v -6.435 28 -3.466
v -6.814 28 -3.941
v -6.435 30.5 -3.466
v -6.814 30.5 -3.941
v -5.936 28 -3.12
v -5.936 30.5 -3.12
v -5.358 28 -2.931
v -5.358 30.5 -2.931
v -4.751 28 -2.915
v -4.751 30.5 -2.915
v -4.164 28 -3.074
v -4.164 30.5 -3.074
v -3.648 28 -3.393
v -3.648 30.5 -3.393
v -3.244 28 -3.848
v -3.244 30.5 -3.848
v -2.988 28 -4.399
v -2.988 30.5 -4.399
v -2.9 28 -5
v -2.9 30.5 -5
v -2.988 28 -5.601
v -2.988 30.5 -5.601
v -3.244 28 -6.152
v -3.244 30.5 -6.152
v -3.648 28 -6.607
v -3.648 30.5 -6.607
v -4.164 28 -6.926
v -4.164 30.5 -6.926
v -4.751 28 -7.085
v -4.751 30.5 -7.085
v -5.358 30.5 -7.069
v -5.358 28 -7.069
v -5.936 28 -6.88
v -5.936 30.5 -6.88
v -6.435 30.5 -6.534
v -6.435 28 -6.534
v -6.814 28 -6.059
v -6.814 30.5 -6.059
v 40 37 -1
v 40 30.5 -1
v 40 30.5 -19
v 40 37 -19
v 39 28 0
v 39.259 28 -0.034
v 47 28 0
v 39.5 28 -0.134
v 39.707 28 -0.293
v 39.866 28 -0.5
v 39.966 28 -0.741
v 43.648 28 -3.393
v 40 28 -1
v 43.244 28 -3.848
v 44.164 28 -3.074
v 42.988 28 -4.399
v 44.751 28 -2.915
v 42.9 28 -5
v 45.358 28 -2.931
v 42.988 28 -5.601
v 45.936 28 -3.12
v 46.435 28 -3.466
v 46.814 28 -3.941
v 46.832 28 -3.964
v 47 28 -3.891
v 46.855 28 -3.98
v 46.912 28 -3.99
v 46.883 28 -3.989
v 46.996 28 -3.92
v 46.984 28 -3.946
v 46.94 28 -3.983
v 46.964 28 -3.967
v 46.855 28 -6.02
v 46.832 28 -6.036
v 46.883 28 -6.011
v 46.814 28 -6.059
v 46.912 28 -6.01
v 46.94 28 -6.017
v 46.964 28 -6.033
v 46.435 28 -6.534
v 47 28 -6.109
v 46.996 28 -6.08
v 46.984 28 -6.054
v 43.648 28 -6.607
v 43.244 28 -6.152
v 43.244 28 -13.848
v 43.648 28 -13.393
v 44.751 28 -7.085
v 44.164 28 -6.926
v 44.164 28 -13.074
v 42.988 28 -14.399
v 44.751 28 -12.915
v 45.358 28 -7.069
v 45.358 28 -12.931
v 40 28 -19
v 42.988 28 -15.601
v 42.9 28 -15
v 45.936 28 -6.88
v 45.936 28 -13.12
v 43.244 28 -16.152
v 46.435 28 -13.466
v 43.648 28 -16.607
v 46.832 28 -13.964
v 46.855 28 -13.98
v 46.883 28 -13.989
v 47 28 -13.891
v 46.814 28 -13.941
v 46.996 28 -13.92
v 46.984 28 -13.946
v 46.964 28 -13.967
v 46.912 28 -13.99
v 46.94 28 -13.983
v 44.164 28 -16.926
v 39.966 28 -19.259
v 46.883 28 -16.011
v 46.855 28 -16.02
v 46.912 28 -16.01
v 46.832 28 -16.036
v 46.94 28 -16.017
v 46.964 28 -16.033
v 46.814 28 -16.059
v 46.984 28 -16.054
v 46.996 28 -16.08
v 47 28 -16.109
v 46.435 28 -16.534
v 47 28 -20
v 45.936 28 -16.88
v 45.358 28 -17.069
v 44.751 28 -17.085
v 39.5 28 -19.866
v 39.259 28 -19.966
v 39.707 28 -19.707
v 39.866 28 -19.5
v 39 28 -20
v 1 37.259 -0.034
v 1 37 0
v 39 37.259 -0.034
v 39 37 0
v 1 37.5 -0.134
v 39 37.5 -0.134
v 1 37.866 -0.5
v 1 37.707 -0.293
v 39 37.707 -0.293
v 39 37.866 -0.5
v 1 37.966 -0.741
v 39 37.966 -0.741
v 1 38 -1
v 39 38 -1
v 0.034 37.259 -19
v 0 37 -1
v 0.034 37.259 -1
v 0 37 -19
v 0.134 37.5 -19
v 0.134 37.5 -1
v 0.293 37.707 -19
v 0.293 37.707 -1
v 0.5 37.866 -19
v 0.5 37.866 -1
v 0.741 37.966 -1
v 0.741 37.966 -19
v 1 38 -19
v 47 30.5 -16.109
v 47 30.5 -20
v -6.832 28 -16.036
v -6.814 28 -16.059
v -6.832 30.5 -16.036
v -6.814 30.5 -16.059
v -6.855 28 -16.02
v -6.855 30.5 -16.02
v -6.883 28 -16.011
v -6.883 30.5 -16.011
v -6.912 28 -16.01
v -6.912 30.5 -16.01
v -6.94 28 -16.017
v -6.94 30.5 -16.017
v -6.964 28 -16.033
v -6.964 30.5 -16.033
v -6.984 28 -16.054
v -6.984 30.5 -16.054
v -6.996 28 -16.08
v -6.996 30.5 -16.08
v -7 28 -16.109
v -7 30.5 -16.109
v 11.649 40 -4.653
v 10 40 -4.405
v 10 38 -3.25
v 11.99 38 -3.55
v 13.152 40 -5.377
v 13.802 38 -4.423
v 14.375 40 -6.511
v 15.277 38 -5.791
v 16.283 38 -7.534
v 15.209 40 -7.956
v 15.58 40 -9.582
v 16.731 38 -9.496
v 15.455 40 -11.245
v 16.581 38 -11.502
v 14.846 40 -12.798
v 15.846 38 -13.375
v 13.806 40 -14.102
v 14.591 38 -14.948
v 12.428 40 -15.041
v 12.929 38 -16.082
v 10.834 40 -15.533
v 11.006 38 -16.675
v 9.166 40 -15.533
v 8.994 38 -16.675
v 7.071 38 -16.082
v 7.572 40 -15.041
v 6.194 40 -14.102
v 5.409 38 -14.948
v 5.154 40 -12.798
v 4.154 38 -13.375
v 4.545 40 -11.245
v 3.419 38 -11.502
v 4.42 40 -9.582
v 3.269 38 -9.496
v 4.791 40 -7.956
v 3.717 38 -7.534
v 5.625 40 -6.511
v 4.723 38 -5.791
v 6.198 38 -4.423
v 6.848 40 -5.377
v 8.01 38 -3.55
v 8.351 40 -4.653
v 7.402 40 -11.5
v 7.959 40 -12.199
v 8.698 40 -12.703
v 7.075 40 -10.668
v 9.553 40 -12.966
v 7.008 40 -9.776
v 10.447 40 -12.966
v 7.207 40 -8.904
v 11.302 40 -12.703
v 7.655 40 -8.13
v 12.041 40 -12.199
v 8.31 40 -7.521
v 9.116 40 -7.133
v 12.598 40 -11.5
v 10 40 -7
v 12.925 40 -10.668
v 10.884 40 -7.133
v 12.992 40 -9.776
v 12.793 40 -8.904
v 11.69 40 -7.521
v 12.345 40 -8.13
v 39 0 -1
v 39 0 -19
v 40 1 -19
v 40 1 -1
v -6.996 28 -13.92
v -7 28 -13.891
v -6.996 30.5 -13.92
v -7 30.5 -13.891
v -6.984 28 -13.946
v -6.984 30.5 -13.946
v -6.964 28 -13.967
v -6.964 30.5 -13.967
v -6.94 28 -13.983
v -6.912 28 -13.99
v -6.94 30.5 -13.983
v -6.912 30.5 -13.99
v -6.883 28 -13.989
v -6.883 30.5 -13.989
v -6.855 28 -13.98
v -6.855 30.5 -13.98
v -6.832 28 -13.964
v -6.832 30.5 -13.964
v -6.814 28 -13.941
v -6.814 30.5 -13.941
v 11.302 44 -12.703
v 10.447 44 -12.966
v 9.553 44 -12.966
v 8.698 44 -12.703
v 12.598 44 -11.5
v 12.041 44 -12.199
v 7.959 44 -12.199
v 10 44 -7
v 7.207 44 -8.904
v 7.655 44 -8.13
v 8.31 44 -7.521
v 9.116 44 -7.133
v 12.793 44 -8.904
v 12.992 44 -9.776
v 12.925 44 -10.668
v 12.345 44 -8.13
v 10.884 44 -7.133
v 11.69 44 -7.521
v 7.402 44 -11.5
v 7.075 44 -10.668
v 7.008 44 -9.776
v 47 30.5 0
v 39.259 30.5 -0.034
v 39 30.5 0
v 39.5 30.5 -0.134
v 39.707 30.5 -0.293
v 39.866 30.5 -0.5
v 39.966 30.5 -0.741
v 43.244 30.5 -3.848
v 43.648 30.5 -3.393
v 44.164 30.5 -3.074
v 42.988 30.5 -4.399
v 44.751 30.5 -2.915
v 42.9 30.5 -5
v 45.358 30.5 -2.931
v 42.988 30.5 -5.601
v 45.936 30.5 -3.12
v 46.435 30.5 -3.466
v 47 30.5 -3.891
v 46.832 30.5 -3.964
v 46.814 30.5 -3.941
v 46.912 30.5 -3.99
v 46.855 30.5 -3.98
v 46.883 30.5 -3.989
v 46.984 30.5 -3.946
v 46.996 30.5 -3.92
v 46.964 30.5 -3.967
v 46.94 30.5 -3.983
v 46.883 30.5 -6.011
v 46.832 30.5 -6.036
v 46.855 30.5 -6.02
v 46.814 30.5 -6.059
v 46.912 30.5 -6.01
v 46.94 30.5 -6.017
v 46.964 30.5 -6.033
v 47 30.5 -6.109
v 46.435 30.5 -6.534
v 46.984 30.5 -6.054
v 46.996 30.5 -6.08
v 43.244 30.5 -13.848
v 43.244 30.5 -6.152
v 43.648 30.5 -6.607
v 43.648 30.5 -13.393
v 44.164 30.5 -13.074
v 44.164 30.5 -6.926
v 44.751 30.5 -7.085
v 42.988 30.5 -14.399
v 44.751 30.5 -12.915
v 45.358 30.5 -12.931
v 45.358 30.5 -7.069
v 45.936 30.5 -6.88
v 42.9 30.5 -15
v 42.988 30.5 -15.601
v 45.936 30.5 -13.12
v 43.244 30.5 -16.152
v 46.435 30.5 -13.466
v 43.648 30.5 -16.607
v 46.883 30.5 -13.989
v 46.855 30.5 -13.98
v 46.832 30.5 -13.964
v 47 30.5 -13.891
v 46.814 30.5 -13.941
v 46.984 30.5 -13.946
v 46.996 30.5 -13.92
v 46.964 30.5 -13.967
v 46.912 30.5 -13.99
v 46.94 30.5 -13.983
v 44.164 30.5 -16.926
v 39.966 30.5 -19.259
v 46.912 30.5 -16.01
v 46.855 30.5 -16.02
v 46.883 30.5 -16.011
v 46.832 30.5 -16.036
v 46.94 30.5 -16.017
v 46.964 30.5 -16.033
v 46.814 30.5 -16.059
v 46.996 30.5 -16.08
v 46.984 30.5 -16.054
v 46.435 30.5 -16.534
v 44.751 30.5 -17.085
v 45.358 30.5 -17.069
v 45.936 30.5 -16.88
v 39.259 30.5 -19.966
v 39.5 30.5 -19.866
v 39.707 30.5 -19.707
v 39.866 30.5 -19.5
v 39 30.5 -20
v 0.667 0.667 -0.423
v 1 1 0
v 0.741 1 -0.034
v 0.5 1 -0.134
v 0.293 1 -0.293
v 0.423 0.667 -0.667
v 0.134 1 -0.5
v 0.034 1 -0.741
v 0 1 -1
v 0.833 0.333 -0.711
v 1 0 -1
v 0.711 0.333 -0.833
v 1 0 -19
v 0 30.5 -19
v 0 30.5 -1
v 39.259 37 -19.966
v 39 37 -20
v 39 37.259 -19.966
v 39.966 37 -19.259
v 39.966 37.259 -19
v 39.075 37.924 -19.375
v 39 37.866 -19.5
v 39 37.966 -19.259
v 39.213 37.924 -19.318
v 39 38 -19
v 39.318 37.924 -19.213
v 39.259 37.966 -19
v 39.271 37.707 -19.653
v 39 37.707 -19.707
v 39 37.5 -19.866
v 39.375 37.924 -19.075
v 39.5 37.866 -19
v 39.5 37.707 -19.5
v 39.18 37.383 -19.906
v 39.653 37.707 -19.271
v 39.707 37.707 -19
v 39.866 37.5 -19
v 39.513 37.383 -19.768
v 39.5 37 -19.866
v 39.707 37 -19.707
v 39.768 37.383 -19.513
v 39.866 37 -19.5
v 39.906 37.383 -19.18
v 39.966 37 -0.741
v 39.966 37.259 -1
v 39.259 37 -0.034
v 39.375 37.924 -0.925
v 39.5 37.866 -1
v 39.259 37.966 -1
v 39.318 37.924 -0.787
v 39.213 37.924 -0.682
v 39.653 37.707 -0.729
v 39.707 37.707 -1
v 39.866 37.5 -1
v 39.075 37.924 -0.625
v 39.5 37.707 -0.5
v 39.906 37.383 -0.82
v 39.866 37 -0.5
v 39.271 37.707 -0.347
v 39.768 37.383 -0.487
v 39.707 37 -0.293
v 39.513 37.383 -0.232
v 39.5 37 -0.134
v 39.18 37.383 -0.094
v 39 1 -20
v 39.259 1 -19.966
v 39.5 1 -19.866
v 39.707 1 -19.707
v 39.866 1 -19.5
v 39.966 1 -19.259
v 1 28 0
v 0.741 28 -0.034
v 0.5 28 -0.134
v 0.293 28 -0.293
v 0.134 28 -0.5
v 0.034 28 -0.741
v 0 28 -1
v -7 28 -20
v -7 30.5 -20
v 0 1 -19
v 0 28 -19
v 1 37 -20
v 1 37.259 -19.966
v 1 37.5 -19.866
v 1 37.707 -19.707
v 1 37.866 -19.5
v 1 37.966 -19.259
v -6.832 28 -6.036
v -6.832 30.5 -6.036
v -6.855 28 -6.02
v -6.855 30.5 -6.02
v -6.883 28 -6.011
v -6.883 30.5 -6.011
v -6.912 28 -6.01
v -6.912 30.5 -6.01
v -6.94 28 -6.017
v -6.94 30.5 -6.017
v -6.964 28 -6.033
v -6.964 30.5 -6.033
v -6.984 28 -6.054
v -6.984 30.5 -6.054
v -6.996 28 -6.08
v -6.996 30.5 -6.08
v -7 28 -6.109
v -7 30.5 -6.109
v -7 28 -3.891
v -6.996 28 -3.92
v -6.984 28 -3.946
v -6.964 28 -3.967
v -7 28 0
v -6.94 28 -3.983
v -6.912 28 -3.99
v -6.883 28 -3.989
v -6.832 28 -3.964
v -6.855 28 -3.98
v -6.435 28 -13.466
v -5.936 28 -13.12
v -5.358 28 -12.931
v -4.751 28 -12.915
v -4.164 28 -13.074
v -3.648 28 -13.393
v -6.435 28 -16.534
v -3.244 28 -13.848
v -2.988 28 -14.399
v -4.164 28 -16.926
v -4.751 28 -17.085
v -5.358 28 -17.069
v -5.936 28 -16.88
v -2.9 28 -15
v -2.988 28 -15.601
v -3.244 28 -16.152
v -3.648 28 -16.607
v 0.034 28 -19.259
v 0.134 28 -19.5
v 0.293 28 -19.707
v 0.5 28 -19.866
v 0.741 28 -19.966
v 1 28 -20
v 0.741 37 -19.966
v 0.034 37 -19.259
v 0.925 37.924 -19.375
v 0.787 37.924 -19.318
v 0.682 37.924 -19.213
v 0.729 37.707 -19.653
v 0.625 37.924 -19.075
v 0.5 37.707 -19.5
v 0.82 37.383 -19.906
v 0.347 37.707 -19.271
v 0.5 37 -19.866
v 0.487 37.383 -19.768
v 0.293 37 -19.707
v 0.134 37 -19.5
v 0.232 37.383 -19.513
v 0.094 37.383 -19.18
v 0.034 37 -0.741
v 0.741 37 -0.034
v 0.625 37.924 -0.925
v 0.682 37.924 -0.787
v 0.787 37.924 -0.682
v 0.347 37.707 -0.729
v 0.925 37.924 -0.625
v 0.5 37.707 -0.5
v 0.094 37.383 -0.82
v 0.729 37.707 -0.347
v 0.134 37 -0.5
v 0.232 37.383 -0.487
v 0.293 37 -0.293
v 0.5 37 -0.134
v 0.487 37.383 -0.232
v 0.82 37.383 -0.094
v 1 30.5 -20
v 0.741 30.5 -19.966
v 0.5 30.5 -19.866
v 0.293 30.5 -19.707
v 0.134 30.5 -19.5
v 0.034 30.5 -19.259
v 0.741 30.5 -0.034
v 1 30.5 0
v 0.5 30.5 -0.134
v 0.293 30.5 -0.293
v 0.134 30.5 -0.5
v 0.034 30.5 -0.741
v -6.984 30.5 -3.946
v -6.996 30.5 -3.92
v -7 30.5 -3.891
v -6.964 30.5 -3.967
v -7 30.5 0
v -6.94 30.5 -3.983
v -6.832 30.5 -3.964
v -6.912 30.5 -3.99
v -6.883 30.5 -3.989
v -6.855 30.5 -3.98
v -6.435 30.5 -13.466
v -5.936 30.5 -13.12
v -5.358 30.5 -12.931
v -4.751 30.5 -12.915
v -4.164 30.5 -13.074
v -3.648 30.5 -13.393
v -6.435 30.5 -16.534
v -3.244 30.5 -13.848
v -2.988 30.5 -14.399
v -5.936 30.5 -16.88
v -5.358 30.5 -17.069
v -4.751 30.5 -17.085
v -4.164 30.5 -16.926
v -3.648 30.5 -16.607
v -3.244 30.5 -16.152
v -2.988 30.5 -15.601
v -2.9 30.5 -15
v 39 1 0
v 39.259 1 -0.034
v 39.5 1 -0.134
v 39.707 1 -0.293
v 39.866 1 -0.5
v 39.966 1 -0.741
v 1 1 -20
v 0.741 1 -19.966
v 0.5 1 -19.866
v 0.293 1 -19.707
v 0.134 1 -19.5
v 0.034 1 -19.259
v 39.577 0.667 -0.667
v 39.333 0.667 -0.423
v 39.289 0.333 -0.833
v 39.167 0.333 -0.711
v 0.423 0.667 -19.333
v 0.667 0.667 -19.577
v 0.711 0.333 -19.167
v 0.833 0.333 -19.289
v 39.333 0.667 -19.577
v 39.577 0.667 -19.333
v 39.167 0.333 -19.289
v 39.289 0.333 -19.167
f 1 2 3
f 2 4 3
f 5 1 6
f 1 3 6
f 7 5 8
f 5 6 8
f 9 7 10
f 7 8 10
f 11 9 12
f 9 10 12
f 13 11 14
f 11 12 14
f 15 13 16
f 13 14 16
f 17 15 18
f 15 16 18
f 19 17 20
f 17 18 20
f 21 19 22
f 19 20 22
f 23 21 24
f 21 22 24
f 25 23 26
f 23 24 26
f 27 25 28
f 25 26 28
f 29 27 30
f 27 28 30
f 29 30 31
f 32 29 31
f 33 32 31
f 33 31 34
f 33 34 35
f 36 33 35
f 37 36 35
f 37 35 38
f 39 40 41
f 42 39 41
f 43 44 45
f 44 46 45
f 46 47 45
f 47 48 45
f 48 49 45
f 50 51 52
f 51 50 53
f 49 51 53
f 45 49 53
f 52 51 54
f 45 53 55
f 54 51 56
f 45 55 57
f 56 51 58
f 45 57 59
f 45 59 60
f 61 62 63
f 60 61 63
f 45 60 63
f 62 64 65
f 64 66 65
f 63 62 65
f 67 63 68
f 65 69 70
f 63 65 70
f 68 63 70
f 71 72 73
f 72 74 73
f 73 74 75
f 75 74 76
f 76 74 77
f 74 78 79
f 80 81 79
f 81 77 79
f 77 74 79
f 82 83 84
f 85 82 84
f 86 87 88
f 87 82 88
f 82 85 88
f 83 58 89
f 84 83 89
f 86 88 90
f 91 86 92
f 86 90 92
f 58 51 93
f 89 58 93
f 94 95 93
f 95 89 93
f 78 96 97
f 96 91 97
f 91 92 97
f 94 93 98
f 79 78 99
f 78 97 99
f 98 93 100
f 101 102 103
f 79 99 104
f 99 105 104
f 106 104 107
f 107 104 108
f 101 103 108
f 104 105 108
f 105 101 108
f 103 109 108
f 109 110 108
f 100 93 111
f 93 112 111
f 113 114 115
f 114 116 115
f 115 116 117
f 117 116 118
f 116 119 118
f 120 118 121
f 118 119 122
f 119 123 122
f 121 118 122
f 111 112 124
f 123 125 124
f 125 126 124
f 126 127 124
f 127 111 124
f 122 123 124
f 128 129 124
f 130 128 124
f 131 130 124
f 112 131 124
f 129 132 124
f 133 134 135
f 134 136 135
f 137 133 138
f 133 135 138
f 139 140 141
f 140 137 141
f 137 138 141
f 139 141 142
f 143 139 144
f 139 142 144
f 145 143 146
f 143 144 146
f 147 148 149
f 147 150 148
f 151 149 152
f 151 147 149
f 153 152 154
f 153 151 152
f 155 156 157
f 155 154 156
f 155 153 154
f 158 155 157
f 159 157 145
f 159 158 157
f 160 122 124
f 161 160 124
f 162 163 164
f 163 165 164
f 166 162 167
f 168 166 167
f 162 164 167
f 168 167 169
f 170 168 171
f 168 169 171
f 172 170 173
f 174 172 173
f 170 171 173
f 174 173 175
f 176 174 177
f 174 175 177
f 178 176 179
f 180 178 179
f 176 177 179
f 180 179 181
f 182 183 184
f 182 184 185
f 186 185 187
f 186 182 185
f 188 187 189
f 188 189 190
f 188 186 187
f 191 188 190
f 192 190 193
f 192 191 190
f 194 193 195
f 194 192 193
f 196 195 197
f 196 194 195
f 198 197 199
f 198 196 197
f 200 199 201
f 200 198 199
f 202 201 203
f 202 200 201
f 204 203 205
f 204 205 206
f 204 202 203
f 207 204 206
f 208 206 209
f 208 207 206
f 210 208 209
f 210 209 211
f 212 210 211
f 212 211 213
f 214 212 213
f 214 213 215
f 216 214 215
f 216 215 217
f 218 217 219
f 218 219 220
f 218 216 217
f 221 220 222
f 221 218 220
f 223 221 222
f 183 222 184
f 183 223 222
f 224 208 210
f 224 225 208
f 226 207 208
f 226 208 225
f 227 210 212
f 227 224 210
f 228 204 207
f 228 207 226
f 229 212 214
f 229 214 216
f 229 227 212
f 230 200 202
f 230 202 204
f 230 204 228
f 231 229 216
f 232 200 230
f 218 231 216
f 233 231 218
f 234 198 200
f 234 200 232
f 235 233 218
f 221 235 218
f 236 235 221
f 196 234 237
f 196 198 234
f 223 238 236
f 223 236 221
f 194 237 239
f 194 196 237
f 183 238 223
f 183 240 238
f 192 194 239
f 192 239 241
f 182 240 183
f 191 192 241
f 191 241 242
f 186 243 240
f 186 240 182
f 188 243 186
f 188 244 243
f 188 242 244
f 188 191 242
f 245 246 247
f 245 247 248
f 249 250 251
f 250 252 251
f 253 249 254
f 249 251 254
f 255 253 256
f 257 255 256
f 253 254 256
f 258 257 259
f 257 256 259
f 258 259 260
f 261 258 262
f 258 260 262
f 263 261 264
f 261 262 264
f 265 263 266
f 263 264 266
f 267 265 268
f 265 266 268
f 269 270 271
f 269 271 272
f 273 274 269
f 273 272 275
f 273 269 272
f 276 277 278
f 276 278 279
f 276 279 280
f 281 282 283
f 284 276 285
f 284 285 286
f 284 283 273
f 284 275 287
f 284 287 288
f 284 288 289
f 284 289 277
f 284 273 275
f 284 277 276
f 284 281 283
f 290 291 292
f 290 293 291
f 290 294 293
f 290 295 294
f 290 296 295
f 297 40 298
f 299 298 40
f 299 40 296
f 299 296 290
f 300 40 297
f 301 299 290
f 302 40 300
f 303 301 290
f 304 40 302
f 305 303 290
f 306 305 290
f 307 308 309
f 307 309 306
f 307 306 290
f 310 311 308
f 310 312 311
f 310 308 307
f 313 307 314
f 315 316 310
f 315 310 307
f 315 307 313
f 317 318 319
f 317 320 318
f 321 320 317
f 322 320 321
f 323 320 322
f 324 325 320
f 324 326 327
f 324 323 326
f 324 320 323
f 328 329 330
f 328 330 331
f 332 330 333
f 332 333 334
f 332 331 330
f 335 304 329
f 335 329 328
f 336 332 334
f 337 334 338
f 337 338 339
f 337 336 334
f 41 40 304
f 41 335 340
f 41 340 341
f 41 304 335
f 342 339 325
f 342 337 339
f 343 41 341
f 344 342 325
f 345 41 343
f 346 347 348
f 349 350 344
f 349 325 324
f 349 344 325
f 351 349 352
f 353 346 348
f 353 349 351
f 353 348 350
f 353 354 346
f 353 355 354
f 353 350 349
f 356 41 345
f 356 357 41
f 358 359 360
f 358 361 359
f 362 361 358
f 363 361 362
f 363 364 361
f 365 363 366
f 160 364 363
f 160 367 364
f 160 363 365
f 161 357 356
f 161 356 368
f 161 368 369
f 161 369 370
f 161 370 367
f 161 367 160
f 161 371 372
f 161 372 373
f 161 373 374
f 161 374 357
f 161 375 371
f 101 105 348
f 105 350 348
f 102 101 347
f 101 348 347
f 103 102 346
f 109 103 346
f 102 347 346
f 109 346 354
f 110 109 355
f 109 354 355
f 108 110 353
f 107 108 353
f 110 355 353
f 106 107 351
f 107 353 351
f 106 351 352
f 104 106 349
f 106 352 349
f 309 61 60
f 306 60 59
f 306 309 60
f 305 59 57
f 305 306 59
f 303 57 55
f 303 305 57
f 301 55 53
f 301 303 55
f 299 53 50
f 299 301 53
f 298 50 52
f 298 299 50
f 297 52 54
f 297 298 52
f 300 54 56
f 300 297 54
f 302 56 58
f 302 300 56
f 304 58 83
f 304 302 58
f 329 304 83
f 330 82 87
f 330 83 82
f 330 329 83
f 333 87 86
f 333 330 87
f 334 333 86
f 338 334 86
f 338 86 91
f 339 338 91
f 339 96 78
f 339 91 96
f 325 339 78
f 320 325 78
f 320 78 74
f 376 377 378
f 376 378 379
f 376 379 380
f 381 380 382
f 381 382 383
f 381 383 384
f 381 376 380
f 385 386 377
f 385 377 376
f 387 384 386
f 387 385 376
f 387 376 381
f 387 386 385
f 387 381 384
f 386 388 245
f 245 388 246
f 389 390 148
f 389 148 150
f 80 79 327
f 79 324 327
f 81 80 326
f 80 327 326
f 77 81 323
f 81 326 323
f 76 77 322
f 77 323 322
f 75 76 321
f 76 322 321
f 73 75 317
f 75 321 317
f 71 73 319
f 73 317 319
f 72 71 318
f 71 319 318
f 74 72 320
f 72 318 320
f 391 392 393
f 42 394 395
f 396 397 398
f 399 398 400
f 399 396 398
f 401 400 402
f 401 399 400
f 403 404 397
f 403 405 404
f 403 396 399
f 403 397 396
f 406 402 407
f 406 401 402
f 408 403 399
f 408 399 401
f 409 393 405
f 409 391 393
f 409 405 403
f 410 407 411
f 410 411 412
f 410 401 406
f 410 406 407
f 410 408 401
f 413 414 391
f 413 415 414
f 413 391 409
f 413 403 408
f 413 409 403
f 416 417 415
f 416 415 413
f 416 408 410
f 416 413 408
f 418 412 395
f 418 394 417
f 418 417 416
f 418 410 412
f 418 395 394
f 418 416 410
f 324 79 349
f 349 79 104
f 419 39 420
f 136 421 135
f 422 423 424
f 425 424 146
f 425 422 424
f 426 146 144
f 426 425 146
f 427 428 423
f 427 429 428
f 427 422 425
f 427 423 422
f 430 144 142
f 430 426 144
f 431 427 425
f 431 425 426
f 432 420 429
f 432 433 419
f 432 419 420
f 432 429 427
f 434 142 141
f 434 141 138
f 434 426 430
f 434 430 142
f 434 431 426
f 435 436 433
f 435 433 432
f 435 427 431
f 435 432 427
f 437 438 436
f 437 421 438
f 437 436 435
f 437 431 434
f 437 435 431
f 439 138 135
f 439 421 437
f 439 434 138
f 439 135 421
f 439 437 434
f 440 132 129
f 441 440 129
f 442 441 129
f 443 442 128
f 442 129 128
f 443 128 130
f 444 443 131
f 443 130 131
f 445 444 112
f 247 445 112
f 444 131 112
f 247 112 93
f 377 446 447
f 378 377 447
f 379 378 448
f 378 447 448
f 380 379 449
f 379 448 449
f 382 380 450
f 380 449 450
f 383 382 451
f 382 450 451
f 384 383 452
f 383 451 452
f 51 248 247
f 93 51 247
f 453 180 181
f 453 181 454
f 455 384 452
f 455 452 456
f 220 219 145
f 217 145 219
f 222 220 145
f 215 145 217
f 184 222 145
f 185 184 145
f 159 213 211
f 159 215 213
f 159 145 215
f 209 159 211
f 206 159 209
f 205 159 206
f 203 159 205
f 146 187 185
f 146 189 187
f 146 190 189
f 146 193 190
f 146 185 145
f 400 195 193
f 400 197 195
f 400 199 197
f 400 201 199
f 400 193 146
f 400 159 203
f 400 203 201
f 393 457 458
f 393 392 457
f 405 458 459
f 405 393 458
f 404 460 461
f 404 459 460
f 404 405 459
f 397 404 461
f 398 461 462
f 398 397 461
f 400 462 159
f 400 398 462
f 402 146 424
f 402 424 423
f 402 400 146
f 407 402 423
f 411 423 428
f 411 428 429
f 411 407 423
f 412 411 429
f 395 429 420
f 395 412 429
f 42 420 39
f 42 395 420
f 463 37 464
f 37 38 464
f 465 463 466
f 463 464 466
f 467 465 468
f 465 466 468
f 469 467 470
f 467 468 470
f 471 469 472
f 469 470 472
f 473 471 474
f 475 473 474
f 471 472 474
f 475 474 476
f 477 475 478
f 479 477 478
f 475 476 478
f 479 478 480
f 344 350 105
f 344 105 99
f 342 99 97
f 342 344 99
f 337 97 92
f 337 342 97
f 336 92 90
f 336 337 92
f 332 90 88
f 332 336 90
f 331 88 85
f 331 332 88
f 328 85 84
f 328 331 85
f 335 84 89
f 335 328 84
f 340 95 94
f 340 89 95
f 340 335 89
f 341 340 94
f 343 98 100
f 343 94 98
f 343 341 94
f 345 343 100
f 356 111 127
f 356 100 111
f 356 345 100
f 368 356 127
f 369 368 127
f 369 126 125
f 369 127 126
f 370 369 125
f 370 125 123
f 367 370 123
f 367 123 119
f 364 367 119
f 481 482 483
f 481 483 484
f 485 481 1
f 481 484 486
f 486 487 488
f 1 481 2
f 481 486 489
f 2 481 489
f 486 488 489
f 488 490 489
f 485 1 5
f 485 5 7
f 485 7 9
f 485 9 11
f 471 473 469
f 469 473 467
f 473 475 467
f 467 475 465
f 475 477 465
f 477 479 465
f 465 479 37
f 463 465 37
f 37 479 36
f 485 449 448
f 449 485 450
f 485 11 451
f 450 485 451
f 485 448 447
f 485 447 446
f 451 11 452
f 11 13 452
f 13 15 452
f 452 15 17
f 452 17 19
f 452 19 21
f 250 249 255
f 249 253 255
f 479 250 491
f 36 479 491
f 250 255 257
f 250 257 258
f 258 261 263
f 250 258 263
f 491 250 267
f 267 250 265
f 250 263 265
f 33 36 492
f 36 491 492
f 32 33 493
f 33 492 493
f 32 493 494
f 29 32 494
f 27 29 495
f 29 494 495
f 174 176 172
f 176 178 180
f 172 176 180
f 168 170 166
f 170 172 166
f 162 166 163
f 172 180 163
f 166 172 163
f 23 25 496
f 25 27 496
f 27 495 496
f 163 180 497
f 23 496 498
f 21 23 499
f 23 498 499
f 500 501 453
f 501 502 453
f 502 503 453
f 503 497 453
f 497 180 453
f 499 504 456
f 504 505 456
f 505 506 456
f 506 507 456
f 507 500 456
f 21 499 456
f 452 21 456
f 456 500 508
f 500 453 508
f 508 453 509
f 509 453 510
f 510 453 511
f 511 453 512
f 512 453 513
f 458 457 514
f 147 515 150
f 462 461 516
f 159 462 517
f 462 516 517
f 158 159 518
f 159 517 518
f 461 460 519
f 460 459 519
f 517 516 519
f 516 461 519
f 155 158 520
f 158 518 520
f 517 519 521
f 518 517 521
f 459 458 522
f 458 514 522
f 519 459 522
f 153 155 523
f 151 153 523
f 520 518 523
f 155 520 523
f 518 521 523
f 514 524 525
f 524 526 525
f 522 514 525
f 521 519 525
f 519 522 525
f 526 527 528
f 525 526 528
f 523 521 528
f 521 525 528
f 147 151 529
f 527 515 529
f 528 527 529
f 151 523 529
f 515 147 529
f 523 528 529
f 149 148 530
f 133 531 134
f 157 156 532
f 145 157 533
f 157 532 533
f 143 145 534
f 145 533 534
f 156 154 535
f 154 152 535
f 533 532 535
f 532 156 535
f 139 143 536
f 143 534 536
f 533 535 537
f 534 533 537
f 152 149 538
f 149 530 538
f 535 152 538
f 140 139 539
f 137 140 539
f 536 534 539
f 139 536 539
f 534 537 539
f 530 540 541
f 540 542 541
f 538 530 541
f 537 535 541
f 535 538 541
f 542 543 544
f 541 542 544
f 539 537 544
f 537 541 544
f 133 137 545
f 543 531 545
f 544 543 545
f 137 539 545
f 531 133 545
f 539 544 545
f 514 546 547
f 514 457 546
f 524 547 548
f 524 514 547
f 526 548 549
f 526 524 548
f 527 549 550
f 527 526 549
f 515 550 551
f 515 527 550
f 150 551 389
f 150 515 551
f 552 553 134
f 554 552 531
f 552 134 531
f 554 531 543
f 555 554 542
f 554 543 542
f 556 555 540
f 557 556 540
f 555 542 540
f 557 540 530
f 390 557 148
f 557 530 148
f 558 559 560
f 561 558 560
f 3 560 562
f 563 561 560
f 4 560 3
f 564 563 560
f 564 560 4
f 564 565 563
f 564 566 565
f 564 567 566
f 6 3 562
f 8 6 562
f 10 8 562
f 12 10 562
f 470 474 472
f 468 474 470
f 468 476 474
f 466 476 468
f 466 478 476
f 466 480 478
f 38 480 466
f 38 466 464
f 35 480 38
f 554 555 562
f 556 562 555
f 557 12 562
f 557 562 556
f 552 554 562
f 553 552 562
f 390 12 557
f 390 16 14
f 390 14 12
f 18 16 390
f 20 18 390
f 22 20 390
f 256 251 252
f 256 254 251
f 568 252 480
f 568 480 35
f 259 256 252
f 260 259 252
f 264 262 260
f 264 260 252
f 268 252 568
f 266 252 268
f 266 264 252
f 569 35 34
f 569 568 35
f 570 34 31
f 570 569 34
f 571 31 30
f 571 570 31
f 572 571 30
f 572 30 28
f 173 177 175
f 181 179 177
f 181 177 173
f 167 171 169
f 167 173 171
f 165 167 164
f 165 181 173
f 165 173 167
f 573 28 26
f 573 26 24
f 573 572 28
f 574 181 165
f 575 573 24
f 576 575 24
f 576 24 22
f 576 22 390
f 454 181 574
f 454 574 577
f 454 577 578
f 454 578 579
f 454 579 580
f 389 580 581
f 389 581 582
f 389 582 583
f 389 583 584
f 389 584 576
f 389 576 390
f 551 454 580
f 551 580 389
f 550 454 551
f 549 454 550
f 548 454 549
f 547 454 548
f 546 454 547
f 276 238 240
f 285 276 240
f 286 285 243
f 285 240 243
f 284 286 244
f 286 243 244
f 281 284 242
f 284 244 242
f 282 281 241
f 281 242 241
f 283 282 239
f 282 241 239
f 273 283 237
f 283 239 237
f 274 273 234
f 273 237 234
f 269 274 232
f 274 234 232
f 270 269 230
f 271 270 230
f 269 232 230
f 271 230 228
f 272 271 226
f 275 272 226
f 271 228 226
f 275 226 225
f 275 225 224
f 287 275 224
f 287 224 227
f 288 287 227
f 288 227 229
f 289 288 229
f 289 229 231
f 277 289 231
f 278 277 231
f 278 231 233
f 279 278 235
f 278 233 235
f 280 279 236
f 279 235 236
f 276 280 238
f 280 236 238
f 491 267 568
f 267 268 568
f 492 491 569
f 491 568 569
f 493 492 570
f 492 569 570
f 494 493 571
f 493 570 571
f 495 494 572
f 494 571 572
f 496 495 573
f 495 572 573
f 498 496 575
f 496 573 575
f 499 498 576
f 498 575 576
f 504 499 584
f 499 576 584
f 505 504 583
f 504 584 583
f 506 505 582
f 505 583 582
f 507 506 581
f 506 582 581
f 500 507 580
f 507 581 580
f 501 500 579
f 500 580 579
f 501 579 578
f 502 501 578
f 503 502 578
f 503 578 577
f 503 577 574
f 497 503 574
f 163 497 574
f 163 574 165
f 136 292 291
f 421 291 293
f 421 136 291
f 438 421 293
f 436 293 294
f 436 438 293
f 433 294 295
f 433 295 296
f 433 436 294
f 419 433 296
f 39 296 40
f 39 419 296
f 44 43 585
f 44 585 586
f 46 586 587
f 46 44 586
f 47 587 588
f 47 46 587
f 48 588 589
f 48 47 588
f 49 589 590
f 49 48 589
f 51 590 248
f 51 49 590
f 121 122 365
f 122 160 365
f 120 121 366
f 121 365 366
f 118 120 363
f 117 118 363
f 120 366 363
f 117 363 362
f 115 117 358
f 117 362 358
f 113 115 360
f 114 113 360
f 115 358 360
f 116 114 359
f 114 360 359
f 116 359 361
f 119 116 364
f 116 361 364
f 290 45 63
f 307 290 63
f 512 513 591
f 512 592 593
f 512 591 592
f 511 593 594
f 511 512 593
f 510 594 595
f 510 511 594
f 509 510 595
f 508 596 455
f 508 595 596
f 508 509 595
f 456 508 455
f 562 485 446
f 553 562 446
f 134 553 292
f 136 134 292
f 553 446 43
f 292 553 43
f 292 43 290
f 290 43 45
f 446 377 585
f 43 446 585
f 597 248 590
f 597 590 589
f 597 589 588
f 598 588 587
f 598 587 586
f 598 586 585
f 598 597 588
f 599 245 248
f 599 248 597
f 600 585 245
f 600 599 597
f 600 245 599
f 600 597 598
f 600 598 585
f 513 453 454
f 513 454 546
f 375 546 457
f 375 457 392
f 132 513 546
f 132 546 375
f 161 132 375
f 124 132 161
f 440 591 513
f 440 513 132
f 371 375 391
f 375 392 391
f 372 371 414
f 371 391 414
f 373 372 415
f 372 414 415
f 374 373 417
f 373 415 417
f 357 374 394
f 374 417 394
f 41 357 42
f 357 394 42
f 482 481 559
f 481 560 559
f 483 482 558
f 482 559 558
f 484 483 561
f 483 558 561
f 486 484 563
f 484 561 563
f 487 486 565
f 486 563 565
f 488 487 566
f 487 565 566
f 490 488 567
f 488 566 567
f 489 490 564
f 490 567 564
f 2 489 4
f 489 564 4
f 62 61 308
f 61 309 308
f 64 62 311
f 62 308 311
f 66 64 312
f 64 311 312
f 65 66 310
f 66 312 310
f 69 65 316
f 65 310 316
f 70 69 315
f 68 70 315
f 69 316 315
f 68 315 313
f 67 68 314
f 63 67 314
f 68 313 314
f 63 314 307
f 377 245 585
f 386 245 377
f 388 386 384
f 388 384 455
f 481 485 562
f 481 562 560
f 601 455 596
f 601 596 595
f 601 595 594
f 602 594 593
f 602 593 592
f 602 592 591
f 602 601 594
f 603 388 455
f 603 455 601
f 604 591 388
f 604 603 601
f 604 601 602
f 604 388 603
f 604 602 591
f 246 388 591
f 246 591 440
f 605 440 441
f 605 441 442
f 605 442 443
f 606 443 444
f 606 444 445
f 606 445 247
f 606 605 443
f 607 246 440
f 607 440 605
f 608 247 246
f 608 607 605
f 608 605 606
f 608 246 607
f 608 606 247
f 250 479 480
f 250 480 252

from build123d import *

# Parameters (mm, degrees)
SKETCH1_W           = 40
SKETCH1_H           = 20
BOSS_EXTRUDE1_DEPTH = 28
SKETCH2_W           = 54
SKETCH2_H           = 20
BOSS_EXTRUDE2_DEPTH = 2.5
SKETCH3_W           = 40
SKETCH3_H           = 20
BOSS_EXTRUDE3_DEPTH = 7.5
SKETCH4_R           = 6.75
BOSS_EXTRUDE4_DEPTH = 2
SKETCH5_R           = 3
BOSS_EXTRUDE5_DEPTH = 4
FILLET1_R           = 1
CHAMFER1_SIZE       = 1
CHAMFER2_SIZE2      = 1.154700538
CHAMFER2_SIZE       = 2
SKETCH6_R           = 2.1
CUT_EXTRUDE1_DEPTH  = 60.491596045
FILLET2_R           = 0.1


with BuildPart() as part:
    # Sketch1 → Boss-Extrude1 (new body)
    with BuildSketch(Plane(origin=(0, 0, 0), x_dir=(1, 0, 0), z_dir=(0, 1, 0))):
        with Locations((20, 10)):
            Rectangle(SKETCH1_W, SKETCH1_H)
    extrude(amount=BOSS_EXTRUDE1_DEPTH)

    # Sketch2 → Boss-Extrude2 (add)
    with BuildSketch(Plane(origin=(0, 28, 0), x_dir=(1, 0, 0), z_dir=(0, 1, 0))):
        with Locations((20, 10)):
            Rectangle(SKETCH2_W, SKETCH2_H)
    extrude(amount=BOSS_EXTRUDE2_DEPTH)

    # Sketch3 → Boss-Extrude3 (add)
    with BuildSketch(Plane(origin=(0, 30.5, 0), x_dir=(1, 0, 0), z_dir=(0, 1, 0))):
        with Locations((20, 10)):
            Rectangle(SKETCH3_W, SKETCH3_H)
    extrude(amount=BOSS_EXTRUDE3_DEPTH)

    # Sketch4 → Boss-Extrude4 (add)
    with BuildSketch(Plane(origin=(0, 38, 0), x_dir=(1, 0, 0), z_dir=(0, 1, 0))):
        with Locations(Location((10, 10, 0), (0, 0, 270))):
            Circle(SKETCH4_R)
    extrude(amount=BOSS_EXTRUDE4_DEPTH)

    # Sketch5 → Boss-Extrude5 (add)
    with BuildSketch(Plane(origin=(0, 40, 0), x_dir=(1, 0, 0), z_dir=(0, 1, 0))):
        with Locations(Location((10, 10, 0), (0, 0, 270))):
            Circle(SKETCH5_R)
    extrude(amount=BOSS_EXTRUDE5_DEPTH)

    # Fillet1
    fillet1_edges = [part.edges().sort_by_distance(p)[0] for p in [
        (40, 14, -20),
        (40, 34.25, -20),
        (40, 34.25, 0),
        (40, 14, 0),
        (0, 34.25, 0),
        (0, 14, 0),
        (0, 14, -20),
        (0, 34.25, -20),
        (20, 38, -20),
        (40, 38, -10),
        (0, 38, -10),
        (20, 38, 0),
    ]]
    fillet(fillet1_edges, radius=FILLET1_R)

    # Chamfer1
    chamfer1_edges = [part.edges().sort_by_distance(p)[0] for p in [
        (20, 0, -20),
        (0, 0, -10),
        (40, 0, -10),
        (20, 0, 0),
        (0.292893219, 0, -19.707106781),
        (0.292893219, 0, -0.292893219),
        (39.707106781, 0, -0.292893219),
        (39.707106781, 0, -19.707106781),
    ]]
    chamfer(chamfer1_edges, length=CHAMFER1_SIZE)

    # Chamfer2
    chamfer2_edges = [part.edges().sort_by_distance(p)[0] for p in [
        (10, 40, -16.75),
    ]]
    chamfer2_side = [part.faces().sort_by_distance(p)[0] for p in [
        (10, 39.976905989, -16.75),
    ]]
    chamfer(chamfer2_edges, length=CHAMFER2_SIZE - 0.0001, length2=CHAMFER2_SIZE2 - 0.0001, reference=chamfer2_side[0])  # a hair under: the kernel refuses the full size

    # Sketch6 → Cut-Extrude1 (cut, through all)
    with BuildSketch(Plane(origin=(0, 30.5, 0), x_dir=(1, 0, 0), z_dir=(0, 1, 0))):
        with Locations((-5, 5)):
            Circle(SKETCH6_R)
        with Locations((-5, 15)):
            Circle(SKETCH6_R)
    cut_extrude1 = extrude(amount=-CUT_EXTRUDE1_DEPTH, mode=Mode.SUBTRACT)

    # Mirror2: Cut-Extrude1 across plane
    add(cut_extrude1.mirror(Plane.ZY.offset(-20)), mode=Mode.SUBTRACT)

    # Fillet2
    fillet2_edges = [part.edges().sort_by_distance(p)[0] for p in [
        (-7, 29.25, -4.359687576),
        (-7, 29.25, -5.640312424),
        (-7, 29.25, -15.640312424),
        (-7, 29.25, -14.359687576),
        (47, 29.25, -4.359687576),
        (47, 29.25, -5.640312424),
        (47, 29.25, -14.359687576),
        (47, 29.25, -15.640312424),
    ]]
    fillet(fillet2_edges, radius=FILLET2_R)


solid = part.part
